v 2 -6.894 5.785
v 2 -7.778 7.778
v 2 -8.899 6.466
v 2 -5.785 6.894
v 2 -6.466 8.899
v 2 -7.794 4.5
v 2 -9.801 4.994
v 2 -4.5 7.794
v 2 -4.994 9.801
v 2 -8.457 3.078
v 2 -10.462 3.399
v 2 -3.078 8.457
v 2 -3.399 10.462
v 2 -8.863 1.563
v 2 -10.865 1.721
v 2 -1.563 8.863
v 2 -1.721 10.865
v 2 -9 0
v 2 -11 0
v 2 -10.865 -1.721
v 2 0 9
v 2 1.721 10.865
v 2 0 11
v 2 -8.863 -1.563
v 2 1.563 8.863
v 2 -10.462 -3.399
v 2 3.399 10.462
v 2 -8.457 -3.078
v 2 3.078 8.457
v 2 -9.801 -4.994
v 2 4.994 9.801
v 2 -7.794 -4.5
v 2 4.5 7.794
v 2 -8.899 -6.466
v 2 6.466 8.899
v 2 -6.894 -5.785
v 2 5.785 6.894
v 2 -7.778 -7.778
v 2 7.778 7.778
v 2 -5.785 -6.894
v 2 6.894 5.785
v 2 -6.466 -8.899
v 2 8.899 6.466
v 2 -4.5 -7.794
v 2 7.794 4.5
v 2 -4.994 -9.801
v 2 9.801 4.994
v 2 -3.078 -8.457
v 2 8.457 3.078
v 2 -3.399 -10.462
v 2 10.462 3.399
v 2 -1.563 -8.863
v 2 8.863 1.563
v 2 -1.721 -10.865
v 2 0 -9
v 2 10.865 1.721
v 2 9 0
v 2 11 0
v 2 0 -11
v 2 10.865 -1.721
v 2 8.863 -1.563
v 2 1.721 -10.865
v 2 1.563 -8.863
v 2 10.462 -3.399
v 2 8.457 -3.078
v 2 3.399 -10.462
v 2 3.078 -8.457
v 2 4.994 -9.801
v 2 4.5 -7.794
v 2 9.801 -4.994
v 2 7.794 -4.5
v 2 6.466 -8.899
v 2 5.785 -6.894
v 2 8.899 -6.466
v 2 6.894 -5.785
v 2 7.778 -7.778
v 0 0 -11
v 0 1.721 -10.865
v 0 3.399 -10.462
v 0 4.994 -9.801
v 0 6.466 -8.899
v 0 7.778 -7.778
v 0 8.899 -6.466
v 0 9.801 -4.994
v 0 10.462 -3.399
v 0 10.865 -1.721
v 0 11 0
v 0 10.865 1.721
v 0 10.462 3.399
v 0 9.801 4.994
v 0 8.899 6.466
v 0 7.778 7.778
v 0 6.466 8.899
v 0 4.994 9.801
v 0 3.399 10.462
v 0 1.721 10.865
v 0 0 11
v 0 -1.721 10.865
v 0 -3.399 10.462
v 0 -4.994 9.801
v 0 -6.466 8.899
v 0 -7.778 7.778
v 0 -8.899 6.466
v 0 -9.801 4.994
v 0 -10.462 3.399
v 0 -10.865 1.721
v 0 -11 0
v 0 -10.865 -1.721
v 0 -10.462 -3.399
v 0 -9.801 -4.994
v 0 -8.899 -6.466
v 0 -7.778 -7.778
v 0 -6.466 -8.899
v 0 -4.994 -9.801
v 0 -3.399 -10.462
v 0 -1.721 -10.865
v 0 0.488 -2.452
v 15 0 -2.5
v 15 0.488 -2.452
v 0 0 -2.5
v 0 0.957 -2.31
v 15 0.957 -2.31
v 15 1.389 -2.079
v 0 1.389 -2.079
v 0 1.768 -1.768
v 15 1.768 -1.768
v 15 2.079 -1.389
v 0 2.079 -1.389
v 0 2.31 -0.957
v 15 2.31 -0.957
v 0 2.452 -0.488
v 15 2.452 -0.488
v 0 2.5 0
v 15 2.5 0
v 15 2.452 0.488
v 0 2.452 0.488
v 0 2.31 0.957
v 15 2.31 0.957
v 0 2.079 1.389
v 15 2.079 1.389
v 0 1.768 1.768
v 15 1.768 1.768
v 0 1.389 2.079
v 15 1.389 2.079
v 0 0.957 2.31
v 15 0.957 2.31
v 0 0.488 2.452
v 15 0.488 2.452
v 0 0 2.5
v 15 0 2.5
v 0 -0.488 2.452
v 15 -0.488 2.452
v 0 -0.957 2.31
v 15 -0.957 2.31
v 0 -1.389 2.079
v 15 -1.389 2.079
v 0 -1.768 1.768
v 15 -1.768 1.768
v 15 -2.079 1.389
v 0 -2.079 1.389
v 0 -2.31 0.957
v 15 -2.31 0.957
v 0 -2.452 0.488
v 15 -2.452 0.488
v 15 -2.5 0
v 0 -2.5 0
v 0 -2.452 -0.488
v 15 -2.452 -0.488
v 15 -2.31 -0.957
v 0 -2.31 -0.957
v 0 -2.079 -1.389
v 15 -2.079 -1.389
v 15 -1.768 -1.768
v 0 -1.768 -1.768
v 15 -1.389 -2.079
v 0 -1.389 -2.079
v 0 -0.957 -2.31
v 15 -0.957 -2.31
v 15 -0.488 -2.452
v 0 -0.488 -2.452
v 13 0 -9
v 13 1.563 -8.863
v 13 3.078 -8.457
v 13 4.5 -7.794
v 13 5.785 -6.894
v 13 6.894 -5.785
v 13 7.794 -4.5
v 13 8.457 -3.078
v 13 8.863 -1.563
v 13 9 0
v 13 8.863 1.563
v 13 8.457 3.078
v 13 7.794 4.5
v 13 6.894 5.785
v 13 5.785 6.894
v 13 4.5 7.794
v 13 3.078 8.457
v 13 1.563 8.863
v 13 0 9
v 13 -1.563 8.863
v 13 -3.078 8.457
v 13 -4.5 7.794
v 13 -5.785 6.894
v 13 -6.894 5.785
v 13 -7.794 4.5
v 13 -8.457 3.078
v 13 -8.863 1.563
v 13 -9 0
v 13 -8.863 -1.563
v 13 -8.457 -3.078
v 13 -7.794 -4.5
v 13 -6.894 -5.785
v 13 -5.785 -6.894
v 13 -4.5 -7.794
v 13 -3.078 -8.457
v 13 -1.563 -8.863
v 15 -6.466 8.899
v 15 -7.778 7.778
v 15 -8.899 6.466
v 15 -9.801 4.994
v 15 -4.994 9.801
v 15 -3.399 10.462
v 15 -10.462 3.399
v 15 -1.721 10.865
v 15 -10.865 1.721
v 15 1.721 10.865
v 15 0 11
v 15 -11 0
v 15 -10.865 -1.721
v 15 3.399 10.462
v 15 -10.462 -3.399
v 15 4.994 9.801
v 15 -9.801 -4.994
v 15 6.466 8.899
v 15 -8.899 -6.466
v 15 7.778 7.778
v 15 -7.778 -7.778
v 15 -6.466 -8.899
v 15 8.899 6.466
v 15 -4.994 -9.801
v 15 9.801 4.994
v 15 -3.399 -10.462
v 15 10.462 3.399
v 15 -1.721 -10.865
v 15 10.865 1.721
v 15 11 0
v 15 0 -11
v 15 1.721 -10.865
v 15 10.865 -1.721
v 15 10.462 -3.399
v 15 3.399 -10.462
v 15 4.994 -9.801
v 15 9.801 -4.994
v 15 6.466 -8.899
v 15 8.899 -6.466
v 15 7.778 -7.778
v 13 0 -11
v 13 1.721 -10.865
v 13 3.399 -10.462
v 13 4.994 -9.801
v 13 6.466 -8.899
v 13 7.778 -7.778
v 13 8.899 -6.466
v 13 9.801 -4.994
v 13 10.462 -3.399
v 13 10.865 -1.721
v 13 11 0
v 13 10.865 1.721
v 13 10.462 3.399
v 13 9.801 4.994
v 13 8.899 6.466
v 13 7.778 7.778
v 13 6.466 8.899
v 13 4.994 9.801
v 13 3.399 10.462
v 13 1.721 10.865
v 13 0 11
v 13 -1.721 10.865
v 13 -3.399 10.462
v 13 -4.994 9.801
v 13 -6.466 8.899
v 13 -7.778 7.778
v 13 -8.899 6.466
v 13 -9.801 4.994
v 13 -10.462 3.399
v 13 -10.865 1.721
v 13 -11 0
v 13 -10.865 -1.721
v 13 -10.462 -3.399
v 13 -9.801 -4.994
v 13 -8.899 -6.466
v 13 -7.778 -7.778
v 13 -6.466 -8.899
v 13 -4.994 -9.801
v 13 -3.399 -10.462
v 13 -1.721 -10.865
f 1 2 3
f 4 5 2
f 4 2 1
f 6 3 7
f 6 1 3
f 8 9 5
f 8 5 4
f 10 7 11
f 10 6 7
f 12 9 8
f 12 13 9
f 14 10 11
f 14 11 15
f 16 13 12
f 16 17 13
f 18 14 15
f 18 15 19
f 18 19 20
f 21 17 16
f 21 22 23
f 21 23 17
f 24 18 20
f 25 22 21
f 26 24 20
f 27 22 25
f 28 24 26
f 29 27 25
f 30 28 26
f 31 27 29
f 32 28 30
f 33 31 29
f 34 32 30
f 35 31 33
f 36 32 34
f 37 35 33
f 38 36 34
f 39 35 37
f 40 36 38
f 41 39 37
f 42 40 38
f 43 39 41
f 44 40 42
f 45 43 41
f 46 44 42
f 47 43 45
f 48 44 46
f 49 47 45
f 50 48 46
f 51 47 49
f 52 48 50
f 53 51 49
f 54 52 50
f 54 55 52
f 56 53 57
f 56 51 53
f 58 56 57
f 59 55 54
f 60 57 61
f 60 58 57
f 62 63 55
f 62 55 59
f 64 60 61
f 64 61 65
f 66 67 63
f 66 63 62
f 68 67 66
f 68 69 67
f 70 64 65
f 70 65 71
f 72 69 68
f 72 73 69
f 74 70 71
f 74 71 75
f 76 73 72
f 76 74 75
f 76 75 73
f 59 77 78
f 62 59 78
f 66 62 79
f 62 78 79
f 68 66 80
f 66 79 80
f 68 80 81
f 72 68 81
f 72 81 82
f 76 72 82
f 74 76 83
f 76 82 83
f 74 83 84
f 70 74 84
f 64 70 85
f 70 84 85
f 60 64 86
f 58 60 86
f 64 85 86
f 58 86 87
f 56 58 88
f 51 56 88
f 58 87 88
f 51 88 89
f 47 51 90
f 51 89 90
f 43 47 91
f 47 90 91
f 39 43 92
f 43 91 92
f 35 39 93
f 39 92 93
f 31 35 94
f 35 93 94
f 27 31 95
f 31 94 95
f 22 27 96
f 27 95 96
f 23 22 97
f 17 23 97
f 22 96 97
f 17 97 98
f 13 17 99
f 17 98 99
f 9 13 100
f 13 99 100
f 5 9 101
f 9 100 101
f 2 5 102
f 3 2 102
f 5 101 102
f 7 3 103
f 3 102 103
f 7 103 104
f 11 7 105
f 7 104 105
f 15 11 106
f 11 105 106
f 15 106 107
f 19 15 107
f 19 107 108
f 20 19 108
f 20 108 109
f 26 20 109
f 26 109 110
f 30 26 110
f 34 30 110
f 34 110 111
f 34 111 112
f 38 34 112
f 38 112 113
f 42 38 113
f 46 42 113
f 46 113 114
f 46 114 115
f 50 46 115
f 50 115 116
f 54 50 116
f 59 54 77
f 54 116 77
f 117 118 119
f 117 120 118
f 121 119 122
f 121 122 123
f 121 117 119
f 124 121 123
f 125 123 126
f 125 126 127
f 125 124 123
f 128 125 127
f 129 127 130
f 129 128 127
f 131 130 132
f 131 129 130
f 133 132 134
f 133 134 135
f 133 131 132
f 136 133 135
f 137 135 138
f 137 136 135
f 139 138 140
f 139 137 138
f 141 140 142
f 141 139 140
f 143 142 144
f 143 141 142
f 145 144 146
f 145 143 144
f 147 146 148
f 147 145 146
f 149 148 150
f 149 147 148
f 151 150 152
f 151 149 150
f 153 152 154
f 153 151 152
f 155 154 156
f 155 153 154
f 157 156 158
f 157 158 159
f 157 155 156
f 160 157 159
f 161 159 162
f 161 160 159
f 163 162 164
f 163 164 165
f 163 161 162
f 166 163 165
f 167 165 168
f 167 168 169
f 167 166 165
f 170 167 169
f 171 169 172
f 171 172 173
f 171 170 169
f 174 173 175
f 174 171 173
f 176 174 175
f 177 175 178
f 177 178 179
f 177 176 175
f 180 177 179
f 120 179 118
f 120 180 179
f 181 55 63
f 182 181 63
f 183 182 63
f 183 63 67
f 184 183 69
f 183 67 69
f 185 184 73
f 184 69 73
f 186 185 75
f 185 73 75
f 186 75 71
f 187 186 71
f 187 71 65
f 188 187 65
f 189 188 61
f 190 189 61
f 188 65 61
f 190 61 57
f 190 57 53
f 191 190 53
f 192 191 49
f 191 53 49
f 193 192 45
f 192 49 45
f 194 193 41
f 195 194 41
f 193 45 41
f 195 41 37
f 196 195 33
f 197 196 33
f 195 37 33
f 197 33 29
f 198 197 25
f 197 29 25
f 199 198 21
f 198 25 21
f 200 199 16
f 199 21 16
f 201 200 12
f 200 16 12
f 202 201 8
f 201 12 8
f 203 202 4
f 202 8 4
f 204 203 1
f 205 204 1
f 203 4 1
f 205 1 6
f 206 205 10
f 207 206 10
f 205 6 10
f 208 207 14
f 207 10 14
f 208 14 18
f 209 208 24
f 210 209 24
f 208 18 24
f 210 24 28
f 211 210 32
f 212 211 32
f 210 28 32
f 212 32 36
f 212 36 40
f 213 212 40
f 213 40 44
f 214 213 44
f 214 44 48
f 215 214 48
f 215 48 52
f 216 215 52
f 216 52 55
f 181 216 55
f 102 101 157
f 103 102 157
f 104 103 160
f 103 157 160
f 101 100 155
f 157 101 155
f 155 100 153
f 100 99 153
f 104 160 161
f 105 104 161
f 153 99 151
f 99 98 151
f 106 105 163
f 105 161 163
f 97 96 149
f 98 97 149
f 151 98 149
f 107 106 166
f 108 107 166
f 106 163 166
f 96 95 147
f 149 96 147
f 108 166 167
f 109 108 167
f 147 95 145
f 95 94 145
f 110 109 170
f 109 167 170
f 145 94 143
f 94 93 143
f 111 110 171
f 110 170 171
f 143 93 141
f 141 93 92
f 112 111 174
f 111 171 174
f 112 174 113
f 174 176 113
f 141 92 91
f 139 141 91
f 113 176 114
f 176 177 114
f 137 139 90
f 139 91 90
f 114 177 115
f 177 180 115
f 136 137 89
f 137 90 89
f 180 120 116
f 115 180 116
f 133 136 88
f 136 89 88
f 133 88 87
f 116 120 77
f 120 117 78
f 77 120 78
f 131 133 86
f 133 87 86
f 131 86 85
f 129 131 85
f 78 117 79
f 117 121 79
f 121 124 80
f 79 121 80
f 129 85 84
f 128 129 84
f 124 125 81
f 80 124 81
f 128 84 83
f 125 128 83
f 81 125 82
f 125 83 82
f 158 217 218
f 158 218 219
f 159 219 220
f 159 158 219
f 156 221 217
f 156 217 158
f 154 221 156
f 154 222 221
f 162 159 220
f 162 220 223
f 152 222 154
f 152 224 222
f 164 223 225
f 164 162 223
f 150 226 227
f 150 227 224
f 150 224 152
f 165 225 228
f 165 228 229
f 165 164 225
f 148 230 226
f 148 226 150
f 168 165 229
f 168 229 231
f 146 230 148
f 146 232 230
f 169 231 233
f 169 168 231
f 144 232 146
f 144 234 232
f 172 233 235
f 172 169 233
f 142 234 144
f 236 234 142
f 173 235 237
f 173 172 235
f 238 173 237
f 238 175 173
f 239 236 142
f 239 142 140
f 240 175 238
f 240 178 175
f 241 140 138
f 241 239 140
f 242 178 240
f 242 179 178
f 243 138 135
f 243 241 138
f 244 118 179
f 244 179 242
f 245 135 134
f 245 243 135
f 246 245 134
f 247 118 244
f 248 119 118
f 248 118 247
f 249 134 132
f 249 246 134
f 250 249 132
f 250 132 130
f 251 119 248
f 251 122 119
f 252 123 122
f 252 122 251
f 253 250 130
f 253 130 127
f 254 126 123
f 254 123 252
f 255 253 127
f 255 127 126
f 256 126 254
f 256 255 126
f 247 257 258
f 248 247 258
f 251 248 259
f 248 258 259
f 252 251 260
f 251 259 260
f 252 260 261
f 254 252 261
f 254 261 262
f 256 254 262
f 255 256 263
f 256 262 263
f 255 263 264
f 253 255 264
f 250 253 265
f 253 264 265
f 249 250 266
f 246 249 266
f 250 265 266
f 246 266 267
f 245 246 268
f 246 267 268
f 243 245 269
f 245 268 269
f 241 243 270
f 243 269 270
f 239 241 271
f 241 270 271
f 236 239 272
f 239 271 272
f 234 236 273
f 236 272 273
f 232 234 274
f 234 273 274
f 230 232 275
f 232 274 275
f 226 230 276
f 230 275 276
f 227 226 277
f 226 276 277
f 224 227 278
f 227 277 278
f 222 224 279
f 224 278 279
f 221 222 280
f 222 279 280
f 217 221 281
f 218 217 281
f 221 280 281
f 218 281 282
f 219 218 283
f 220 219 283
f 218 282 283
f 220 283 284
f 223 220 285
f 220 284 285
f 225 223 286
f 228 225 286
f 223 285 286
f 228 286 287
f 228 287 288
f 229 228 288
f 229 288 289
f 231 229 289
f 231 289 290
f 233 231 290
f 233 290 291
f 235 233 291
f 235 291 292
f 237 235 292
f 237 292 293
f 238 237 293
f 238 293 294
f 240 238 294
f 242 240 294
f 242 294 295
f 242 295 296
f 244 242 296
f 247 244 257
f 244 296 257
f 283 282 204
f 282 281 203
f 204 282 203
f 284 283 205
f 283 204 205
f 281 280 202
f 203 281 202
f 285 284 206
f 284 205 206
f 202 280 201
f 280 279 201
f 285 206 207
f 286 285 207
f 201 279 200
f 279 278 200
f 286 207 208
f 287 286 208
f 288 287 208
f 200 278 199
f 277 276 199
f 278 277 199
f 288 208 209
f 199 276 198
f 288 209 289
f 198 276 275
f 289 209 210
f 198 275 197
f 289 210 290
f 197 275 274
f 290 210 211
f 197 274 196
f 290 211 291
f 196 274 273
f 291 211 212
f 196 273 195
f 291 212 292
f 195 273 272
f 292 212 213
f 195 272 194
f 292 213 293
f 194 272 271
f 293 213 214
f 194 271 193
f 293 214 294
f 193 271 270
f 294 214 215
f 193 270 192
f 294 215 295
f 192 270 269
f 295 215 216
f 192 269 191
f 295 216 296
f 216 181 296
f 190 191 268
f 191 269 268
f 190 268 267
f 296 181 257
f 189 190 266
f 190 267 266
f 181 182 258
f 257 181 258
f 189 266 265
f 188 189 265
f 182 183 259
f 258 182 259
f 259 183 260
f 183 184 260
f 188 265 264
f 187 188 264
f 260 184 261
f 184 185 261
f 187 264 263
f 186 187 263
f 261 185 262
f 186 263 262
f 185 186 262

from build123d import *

# Parameters (mm, degrees)
SKETCH_1_R      = 11
SKETCH_1_R_2    = 2.5
EXTRUDE_1_DEPTH = 2
SKETCH_2_R      = 9
SKETCH_2_R_2    = 2.5
EXTRUDE_2_DEPTH = 11
SKETCH_3_R      = 11
SKETCH_3_R_2    = 2.5
EXTRUDE_3_DEPTH = 2


with BuildPart() as part:
    # 草图1 → 凸台-拉伸1 (new body)
    with BuildSketch(Plane(origin=(0, 0, 0), x_dir=(0, 0, -1), z_dir=(1, 0, 0))):
        Circle(SKETCH_1_R)
        Circle(SKETCH_1_R_2, mode=Mode.SUBTRACT)
    extrude(amount=EXTRUDE_1_DEPTH)

    # 草图2 → 凸台-拉伸2 (add)
    with BuildSketch(Plane(origin=(2, 0, 0), x_dir=(0, 0, -1), z_dir=(1, 0, 0))):
        Circle(SKETCH_2_R)
        Circle(SKETCH_2_R_2, mode=Mode.SUBTRACT)
    extrude(amount=EXTRUDE_2_DEPTH)

    # 草图3 → 凸台-拉伸3 (add)
    with BuildSketch(Plane(origin=(13, 0, 0), x_dir=(0, 0, -1), z_dir=(1, 0, 0))):
        Circle(SKETCH_3_R)
        Circle(SKETCH_3_R_2, mode=Mode.SUBTRACT)
    extrude(amount=EXTRUDE_3_DEPTH)


solid = part.part
